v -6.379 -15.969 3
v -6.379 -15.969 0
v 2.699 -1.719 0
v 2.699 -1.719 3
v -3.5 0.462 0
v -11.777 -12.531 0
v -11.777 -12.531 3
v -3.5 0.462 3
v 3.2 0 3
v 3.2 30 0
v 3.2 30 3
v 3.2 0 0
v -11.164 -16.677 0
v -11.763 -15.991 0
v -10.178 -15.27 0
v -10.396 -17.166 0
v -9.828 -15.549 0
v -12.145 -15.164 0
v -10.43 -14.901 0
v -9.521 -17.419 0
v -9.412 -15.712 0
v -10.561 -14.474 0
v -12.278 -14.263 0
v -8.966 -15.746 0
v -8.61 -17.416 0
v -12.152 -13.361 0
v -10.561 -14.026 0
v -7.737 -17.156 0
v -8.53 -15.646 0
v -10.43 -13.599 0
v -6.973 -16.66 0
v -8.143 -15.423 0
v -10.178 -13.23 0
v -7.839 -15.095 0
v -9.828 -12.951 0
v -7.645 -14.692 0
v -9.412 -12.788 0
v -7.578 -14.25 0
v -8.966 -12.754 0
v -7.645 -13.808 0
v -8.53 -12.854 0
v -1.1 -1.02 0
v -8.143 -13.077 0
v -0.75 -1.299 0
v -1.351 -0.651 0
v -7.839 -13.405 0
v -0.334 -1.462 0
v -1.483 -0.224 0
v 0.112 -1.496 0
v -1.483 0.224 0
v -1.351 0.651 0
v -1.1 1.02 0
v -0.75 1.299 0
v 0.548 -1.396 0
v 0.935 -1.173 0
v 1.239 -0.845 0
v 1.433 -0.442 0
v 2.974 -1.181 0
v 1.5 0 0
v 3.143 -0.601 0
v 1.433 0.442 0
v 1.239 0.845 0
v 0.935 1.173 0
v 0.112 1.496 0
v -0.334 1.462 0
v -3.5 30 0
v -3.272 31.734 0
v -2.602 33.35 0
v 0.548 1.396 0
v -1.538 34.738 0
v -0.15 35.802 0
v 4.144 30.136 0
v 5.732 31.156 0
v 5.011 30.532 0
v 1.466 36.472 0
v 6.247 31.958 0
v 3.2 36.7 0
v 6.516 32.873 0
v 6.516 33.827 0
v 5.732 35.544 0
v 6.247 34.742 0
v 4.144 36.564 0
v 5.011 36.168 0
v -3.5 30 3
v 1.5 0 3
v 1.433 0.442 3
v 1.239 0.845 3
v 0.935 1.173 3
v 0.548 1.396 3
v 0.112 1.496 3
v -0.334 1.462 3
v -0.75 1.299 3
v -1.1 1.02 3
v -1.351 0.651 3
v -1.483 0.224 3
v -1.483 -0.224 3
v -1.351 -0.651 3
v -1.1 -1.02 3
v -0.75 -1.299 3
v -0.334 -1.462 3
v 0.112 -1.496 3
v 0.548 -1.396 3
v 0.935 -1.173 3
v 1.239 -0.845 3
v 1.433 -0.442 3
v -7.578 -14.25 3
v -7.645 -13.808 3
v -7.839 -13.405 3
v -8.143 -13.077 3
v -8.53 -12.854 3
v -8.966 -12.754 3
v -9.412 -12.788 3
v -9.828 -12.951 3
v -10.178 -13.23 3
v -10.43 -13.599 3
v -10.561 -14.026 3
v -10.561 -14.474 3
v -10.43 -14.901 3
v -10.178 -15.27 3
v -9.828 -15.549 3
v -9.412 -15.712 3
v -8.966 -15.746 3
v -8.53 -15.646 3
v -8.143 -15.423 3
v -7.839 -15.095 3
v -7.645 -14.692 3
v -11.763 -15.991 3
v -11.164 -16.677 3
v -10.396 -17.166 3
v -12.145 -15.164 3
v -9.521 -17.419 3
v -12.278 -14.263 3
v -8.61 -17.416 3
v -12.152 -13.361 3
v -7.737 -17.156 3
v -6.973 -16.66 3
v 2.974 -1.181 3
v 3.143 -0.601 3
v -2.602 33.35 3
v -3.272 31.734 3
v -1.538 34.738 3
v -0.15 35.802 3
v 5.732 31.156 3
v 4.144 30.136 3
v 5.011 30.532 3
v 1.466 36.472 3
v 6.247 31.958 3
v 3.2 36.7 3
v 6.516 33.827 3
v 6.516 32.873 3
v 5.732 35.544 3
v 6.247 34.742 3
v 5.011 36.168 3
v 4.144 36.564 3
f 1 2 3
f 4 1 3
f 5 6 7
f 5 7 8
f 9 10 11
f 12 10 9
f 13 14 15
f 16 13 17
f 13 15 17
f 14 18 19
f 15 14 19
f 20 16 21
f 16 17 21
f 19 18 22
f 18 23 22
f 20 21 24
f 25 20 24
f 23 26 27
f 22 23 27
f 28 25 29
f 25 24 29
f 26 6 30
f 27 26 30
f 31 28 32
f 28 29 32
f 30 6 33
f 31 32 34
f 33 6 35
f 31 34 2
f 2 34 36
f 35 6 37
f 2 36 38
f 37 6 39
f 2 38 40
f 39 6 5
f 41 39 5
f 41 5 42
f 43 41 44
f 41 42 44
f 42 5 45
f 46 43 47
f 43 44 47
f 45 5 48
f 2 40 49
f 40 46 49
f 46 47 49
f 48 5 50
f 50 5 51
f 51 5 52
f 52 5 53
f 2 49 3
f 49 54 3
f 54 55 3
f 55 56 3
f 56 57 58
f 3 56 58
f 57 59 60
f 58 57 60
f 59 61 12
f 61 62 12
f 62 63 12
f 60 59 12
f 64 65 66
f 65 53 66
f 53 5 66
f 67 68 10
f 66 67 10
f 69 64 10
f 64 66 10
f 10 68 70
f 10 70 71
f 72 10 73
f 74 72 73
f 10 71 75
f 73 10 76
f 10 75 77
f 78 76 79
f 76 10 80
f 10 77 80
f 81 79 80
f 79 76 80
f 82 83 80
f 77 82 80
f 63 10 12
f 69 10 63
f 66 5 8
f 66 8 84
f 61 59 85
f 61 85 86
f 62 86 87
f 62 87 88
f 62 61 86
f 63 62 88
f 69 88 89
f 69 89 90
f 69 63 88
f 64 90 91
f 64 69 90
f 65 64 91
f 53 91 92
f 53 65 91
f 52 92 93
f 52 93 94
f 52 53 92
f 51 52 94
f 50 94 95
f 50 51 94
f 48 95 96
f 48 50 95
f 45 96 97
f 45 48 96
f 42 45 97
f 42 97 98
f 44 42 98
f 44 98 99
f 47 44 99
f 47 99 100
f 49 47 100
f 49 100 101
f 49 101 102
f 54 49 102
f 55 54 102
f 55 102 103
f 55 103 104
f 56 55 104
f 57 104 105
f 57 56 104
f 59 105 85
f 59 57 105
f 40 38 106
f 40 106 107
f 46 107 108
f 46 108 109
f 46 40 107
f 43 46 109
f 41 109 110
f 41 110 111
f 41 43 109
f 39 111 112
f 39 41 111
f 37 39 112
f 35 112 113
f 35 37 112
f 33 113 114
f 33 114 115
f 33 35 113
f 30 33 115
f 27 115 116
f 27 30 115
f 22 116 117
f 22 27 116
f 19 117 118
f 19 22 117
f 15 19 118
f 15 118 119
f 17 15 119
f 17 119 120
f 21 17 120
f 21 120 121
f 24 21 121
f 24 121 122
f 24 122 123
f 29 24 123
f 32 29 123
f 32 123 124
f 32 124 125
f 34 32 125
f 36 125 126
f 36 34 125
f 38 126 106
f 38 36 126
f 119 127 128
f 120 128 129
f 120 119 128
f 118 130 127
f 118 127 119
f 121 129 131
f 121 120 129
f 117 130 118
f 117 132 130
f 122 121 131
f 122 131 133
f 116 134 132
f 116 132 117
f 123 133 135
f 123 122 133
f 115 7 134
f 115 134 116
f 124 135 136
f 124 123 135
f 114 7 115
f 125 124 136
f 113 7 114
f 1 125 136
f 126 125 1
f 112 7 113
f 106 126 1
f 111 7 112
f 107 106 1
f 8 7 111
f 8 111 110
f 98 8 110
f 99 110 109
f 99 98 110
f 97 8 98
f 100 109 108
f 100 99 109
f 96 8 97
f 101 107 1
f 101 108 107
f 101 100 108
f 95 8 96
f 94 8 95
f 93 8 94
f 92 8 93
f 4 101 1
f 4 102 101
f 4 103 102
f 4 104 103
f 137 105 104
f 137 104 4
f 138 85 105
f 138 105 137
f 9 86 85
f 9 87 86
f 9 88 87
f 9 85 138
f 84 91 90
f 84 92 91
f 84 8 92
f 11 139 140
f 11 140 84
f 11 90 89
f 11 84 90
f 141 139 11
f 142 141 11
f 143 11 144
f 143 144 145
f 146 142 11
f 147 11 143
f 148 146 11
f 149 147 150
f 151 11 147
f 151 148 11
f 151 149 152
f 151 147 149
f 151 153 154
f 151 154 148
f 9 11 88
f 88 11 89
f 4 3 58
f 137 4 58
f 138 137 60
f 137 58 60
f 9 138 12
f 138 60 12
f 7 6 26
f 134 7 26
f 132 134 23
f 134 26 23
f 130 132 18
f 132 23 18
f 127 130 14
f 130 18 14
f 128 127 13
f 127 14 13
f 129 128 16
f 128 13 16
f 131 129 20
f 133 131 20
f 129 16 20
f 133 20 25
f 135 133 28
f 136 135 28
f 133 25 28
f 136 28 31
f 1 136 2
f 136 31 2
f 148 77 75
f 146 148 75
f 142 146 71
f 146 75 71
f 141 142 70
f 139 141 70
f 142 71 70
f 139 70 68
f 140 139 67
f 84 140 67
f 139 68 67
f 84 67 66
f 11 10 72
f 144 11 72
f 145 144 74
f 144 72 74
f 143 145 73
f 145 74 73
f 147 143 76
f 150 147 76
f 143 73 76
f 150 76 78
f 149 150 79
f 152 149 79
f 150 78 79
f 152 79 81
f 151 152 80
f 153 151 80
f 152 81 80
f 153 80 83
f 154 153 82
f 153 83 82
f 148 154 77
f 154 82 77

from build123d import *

# Parameters (mm, degrees)
SKETCH_R  = 1.5
PAD_DEPTH = 3


with BuildPart() as part:
    # Sketch → Pad (new body)
    with BuildSketch(Plane.XY):
        with BuildLine():
            ThreePointArc((-11.777104, -12.530641), (-10.79761, -16.948853), (-6.379399, -15.969359))
            Line((-6.379399, -15.969359), (2.698853, -1.719359))
            ThreePointArc((2.698853, -1.719359), (3.07216, -0.895453), (3.2, 0))
            Line((3.2, 30), (3.2, 0))
            ThreePointArc((3.2, 30), (6.55, 33.35), (3.2, 36.7))
            ThreePointArc((3.2, 36.7), (-1.537615, 34.737615), (-3.5, 30))
            Line((-3.5, 0.461809), (-3.5, 30))
            Line((-11.777104, -12.530641), (-3.5, 0.461809))
        make_face()
        with Locations((-9.078251, -14.25)):
            Circle(SKETCH_R, mode=Mode.SUBTRACT)
        Circle(SKETCH_R, mode=Mode.SUBTRACT)
    extrude(amount=PAD_DEPTH)


solid = part.part
